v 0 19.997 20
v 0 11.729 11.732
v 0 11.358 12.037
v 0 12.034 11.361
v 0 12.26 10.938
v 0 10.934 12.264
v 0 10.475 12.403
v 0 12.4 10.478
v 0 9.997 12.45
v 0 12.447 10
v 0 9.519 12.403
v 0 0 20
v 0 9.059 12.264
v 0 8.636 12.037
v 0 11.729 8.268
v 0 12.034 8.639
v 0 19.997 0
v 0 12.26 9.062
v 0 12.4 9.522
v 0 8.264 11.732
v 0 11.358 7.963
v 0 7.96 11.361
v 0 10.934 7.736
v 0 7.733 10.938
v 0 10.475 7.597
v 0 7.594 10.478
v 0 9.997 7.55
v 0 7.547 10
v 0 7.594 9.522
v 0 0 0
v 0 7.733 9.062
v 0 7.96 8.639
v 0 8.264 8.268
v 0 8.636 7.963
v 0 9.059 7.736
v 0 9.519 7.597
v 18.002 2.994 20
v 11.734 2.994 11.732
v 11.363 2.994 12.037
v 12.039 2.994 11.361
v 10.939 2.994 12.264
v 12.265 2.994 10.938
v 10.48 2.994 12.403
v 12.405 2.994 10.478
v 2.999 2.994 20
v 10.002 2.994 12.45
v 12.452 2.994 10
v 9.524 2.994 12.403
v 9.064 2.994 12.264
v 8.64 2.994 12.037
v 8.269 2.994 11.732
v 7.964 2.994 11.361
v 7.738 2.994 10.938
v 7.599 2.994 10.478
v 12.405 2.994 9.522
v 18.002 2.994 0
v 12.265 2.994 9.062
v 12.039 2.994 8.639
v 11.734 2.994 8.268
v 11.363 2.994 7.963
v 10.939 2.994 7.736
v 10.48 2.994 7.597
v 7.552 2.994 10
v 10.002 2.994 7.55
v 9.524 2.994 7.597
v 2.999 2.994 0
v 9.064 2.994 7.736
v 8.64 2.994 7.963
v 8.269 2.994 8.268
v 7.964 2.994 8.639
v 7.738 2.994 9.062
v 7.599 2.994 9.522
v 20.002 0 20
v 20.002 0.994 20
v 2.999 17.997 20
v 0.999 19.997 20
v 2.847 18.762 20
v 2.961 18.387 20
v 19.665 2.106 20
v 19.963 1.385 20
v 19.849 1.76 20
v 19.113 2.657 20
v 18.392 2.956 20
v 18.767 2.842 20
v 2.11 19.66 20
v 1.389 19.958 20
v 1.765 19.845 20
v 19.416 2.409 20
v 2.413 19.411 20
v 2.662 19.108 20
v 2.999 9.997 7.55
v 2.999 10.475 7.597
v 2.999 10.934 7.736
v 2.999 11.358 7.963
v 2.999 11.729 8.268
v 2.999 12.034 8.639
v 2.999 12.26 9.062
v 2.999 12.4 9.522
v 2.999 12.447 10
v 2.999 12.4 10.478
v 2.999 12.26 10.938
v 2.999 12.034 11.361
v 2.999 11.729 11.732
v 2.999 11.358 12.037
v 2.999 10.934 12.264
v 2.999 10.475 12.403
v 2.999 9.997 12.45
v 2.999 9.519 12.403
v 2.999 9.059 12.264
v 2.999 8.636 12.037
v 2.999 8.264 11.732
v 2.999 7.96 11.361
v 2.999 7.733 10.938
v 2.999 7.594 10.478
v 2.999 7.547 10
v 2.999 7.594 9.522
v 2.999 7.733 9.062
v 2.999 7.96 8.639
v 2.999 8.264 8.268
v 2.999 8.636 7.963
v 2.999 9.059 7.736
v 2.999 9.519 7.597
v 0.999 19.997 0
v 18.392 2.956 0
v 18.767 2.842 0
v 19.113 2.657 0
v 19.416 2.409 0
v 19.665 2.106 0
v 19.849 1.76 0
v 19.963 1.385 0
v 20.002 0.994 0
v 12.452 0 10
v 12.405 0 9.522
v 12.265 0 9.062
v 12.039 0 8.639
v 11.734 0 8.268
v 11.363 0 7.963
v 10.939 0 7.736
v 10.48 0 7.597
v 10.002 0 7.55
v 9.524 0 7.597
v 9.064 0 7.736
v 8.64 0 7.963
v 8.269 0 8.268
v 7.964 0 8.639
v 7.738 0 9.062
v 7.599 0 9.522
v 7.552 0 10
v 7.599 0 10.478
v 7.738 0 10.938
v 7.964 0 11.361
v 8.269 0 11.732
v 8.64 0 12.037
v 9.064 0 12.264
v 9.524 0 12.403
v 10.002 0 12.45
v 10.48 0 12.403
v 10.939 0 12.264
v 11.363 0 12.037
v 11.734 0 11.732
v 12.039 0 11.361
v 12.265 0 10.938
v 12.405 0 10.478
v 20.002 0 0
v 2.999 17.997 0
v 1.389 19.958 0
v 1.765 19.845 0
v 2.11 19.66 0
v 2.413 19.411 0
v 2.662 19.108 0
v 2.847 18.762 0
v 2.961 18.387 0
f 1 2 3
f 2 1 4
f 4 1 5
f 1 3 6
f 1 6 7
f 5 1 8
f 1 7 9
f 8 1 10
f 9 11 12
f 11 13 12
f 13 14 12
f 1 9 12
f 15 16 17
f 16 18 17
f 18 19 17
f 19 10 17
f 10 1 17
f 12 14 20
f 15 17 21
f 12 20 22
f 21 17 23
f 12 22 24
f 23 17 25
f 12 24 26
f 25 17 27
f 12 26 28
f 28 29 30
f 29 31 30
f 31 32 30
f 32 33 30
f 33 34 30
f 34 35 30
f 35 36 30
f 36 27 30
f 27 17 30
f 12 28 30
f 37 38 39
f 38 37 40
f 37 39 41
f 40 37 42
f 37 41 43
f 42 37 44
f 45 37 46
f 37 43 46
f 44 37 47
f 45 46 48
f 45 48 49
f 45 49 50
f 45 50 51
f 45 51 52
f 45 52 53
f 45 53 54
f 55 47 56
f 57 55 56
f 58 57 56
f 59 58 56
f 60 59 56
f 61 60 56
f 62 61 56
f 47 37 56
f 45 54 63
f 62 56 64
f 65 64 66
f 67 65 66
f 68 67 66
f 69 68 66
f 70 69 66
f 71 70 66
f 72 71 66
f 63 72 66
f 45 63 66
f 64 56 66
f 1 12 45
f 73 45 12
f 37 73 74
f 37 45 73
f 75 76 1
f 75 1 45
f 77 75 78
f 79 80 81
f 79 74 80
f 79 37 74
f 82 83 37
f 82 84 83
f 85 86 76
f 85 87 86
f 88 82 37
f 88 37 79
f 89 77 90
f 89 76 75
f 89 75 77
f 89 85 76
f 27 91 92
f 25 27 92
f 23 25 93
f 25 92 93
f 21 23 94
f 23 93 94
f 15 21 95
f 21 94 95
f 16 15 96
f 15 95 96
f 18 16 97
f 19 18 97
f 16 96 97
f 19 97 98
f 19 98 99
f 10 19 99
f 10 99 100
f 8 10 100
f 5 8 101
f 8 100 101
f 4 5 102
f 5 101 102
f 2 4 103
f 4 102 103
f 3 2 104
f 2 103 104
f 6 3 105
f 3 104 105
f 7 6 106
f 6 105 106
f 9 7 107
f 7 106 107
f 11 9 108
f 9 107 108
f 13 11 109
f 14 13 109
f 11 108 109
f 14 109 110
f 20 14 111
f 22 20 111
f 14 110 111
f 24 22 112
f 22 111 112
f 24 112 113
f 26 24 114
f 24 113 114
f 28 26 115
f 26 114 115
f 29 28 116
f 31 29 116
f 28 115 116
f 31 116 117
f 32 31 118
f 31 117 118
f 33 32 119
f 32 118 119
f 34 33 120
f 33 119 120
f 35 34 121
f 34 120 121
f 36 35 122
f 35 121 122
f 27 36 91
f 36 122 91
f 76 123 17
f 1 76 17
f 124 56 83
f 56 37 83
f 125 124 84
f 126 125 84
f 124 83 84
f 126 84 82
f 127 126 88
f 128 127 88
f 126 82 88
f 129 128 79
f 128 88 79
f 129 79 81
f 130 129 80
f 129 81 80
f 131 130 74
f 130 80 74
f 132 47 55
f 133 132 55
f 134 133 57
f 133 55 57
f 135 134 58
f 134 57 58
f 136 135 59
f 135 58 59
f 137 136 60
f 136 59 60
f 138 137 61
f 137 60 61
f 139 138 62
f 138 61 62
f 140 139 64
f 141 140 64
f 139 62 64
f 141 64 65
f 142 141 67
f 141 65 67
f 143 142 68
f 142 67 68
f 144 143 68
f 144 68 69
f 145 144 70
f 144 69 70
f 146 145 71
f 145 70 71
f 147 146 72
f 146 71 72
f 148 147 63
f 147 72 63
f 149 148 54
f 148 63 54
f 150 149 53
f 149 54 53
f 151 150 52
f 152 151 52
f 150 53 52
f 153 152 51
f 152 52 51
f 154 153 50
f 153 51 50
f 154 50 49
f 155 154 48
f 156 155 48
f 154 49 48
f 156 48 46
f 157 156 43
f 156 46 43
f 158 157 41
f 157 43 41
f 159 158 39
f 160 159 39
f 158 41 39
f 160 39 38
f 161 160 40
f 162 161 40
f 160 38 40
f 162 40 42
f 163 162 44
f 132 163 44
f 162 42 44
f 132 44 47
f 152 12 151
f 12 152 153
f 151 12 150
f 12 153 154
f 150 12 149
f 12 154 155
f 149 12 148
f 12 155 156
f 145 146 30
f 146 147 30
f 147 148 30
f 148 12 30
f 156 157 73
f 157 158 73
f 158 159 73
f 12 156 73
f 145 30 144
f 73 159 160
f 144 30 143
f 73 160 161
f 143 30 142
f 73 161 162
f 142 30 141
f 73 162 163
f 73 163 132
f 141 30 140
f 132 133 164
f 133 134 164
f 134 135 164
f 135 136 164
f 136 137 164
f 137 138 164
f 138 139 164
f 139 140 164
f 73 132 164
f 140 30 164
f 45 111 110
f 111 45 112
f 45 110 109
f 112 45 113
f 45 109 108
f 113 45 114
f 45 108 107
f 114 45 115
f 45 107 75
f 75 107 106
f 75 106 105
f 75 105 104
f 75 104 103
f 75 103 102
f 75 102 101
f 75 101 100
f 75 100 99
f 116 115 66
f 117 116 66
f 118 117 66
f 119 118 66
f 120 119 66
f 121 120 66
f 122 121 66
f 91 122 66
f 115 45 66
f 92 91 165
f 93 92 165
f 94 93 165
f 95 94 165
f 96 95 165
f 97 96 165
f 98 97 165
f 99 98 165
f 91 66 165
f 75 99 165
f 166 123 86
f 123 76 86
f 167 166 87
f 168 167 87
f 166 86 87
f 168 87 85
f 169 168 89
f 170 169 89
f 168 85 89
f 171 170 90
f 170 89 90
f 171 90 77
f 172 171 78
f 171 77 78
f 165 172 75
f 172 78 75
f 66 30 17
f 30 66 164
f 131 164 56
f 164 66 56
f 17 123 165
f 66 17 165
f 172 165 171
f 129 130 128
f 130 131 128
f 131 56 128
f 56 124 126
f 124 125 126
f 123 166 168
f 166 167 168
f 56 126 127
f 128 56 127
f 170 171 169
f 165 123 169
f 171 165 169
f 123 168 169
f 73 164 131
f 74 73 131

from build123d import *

# Parameters (mm, degrees)
EXTRUDE_1_DEPTH     = 20
SKETCH_3_R          = 2.45
CUT_EXTRUDE_1_DEPTH = 2.999162
SKETCH_5_R          = 2.45
CUT_EXTRUDE_2_DEPTH = 2.994438
FILLET_1_R          = 2
FILLET_2_R          = 2


with BuildPart() as part:
    # 草图1 → 凸台-拉伸1 (new body)
    with BuildSketch(Plane.XY):
        Polygon((0, 0), (20.001593334, 0), (20.001593334, 2.994438252), (2.999161685, 2.994438252), (2.999161685, 19.996869901), (0, 19.996869901), align=None)
    extrude(amount=EXTRUDE_1_DEPTH)

    # 草图3 → 切除-拉伸1 (cut)
    with BuildSketch(Plane(origin=(2.999161685, 0, 0), x_dir=(0, 0, -1), z_dir=(1, 0, 0))):
        with Locations((-10, 9.996869901)):
            Circle(SKETCH_3_R)
    extrude(amount=-CUT_EXTRUDE_1_DEPTH, mode=Mode.SUBTRACT)

    # 草图5 → 切除-拉伸2 (cut)
    with BuildSketch(Plane(origin=(0, 2.994438252, 0), x_dir=(1, 0, 0), z_dir=(0, 1, 0))):
        with Locations((10.001593334, -10)):
            Circle(SKETCH_5_R)
    extrude(amount=-CUT_EXTRUDE_2_DEPTH, mode=Mode.SUBTRACT)

    # 圆角1
    fillet_1_edges = [part.edges().sort_by_distance(p)[0] for p in [
        (2.999161685, 19.996869901, 10),
    ]]
    fillet(fillet_1_edges, radius=FILLET_1_R)

    # 圆角2
    fillet_2_edges = [part.edges().sort_by_distance(p)[0] for p in [
        (20.001593334, 2.994438252, 10),
    ]]
    fillet(fillet_2_edges, radius=FILLET_2_R)


solid = part.part
